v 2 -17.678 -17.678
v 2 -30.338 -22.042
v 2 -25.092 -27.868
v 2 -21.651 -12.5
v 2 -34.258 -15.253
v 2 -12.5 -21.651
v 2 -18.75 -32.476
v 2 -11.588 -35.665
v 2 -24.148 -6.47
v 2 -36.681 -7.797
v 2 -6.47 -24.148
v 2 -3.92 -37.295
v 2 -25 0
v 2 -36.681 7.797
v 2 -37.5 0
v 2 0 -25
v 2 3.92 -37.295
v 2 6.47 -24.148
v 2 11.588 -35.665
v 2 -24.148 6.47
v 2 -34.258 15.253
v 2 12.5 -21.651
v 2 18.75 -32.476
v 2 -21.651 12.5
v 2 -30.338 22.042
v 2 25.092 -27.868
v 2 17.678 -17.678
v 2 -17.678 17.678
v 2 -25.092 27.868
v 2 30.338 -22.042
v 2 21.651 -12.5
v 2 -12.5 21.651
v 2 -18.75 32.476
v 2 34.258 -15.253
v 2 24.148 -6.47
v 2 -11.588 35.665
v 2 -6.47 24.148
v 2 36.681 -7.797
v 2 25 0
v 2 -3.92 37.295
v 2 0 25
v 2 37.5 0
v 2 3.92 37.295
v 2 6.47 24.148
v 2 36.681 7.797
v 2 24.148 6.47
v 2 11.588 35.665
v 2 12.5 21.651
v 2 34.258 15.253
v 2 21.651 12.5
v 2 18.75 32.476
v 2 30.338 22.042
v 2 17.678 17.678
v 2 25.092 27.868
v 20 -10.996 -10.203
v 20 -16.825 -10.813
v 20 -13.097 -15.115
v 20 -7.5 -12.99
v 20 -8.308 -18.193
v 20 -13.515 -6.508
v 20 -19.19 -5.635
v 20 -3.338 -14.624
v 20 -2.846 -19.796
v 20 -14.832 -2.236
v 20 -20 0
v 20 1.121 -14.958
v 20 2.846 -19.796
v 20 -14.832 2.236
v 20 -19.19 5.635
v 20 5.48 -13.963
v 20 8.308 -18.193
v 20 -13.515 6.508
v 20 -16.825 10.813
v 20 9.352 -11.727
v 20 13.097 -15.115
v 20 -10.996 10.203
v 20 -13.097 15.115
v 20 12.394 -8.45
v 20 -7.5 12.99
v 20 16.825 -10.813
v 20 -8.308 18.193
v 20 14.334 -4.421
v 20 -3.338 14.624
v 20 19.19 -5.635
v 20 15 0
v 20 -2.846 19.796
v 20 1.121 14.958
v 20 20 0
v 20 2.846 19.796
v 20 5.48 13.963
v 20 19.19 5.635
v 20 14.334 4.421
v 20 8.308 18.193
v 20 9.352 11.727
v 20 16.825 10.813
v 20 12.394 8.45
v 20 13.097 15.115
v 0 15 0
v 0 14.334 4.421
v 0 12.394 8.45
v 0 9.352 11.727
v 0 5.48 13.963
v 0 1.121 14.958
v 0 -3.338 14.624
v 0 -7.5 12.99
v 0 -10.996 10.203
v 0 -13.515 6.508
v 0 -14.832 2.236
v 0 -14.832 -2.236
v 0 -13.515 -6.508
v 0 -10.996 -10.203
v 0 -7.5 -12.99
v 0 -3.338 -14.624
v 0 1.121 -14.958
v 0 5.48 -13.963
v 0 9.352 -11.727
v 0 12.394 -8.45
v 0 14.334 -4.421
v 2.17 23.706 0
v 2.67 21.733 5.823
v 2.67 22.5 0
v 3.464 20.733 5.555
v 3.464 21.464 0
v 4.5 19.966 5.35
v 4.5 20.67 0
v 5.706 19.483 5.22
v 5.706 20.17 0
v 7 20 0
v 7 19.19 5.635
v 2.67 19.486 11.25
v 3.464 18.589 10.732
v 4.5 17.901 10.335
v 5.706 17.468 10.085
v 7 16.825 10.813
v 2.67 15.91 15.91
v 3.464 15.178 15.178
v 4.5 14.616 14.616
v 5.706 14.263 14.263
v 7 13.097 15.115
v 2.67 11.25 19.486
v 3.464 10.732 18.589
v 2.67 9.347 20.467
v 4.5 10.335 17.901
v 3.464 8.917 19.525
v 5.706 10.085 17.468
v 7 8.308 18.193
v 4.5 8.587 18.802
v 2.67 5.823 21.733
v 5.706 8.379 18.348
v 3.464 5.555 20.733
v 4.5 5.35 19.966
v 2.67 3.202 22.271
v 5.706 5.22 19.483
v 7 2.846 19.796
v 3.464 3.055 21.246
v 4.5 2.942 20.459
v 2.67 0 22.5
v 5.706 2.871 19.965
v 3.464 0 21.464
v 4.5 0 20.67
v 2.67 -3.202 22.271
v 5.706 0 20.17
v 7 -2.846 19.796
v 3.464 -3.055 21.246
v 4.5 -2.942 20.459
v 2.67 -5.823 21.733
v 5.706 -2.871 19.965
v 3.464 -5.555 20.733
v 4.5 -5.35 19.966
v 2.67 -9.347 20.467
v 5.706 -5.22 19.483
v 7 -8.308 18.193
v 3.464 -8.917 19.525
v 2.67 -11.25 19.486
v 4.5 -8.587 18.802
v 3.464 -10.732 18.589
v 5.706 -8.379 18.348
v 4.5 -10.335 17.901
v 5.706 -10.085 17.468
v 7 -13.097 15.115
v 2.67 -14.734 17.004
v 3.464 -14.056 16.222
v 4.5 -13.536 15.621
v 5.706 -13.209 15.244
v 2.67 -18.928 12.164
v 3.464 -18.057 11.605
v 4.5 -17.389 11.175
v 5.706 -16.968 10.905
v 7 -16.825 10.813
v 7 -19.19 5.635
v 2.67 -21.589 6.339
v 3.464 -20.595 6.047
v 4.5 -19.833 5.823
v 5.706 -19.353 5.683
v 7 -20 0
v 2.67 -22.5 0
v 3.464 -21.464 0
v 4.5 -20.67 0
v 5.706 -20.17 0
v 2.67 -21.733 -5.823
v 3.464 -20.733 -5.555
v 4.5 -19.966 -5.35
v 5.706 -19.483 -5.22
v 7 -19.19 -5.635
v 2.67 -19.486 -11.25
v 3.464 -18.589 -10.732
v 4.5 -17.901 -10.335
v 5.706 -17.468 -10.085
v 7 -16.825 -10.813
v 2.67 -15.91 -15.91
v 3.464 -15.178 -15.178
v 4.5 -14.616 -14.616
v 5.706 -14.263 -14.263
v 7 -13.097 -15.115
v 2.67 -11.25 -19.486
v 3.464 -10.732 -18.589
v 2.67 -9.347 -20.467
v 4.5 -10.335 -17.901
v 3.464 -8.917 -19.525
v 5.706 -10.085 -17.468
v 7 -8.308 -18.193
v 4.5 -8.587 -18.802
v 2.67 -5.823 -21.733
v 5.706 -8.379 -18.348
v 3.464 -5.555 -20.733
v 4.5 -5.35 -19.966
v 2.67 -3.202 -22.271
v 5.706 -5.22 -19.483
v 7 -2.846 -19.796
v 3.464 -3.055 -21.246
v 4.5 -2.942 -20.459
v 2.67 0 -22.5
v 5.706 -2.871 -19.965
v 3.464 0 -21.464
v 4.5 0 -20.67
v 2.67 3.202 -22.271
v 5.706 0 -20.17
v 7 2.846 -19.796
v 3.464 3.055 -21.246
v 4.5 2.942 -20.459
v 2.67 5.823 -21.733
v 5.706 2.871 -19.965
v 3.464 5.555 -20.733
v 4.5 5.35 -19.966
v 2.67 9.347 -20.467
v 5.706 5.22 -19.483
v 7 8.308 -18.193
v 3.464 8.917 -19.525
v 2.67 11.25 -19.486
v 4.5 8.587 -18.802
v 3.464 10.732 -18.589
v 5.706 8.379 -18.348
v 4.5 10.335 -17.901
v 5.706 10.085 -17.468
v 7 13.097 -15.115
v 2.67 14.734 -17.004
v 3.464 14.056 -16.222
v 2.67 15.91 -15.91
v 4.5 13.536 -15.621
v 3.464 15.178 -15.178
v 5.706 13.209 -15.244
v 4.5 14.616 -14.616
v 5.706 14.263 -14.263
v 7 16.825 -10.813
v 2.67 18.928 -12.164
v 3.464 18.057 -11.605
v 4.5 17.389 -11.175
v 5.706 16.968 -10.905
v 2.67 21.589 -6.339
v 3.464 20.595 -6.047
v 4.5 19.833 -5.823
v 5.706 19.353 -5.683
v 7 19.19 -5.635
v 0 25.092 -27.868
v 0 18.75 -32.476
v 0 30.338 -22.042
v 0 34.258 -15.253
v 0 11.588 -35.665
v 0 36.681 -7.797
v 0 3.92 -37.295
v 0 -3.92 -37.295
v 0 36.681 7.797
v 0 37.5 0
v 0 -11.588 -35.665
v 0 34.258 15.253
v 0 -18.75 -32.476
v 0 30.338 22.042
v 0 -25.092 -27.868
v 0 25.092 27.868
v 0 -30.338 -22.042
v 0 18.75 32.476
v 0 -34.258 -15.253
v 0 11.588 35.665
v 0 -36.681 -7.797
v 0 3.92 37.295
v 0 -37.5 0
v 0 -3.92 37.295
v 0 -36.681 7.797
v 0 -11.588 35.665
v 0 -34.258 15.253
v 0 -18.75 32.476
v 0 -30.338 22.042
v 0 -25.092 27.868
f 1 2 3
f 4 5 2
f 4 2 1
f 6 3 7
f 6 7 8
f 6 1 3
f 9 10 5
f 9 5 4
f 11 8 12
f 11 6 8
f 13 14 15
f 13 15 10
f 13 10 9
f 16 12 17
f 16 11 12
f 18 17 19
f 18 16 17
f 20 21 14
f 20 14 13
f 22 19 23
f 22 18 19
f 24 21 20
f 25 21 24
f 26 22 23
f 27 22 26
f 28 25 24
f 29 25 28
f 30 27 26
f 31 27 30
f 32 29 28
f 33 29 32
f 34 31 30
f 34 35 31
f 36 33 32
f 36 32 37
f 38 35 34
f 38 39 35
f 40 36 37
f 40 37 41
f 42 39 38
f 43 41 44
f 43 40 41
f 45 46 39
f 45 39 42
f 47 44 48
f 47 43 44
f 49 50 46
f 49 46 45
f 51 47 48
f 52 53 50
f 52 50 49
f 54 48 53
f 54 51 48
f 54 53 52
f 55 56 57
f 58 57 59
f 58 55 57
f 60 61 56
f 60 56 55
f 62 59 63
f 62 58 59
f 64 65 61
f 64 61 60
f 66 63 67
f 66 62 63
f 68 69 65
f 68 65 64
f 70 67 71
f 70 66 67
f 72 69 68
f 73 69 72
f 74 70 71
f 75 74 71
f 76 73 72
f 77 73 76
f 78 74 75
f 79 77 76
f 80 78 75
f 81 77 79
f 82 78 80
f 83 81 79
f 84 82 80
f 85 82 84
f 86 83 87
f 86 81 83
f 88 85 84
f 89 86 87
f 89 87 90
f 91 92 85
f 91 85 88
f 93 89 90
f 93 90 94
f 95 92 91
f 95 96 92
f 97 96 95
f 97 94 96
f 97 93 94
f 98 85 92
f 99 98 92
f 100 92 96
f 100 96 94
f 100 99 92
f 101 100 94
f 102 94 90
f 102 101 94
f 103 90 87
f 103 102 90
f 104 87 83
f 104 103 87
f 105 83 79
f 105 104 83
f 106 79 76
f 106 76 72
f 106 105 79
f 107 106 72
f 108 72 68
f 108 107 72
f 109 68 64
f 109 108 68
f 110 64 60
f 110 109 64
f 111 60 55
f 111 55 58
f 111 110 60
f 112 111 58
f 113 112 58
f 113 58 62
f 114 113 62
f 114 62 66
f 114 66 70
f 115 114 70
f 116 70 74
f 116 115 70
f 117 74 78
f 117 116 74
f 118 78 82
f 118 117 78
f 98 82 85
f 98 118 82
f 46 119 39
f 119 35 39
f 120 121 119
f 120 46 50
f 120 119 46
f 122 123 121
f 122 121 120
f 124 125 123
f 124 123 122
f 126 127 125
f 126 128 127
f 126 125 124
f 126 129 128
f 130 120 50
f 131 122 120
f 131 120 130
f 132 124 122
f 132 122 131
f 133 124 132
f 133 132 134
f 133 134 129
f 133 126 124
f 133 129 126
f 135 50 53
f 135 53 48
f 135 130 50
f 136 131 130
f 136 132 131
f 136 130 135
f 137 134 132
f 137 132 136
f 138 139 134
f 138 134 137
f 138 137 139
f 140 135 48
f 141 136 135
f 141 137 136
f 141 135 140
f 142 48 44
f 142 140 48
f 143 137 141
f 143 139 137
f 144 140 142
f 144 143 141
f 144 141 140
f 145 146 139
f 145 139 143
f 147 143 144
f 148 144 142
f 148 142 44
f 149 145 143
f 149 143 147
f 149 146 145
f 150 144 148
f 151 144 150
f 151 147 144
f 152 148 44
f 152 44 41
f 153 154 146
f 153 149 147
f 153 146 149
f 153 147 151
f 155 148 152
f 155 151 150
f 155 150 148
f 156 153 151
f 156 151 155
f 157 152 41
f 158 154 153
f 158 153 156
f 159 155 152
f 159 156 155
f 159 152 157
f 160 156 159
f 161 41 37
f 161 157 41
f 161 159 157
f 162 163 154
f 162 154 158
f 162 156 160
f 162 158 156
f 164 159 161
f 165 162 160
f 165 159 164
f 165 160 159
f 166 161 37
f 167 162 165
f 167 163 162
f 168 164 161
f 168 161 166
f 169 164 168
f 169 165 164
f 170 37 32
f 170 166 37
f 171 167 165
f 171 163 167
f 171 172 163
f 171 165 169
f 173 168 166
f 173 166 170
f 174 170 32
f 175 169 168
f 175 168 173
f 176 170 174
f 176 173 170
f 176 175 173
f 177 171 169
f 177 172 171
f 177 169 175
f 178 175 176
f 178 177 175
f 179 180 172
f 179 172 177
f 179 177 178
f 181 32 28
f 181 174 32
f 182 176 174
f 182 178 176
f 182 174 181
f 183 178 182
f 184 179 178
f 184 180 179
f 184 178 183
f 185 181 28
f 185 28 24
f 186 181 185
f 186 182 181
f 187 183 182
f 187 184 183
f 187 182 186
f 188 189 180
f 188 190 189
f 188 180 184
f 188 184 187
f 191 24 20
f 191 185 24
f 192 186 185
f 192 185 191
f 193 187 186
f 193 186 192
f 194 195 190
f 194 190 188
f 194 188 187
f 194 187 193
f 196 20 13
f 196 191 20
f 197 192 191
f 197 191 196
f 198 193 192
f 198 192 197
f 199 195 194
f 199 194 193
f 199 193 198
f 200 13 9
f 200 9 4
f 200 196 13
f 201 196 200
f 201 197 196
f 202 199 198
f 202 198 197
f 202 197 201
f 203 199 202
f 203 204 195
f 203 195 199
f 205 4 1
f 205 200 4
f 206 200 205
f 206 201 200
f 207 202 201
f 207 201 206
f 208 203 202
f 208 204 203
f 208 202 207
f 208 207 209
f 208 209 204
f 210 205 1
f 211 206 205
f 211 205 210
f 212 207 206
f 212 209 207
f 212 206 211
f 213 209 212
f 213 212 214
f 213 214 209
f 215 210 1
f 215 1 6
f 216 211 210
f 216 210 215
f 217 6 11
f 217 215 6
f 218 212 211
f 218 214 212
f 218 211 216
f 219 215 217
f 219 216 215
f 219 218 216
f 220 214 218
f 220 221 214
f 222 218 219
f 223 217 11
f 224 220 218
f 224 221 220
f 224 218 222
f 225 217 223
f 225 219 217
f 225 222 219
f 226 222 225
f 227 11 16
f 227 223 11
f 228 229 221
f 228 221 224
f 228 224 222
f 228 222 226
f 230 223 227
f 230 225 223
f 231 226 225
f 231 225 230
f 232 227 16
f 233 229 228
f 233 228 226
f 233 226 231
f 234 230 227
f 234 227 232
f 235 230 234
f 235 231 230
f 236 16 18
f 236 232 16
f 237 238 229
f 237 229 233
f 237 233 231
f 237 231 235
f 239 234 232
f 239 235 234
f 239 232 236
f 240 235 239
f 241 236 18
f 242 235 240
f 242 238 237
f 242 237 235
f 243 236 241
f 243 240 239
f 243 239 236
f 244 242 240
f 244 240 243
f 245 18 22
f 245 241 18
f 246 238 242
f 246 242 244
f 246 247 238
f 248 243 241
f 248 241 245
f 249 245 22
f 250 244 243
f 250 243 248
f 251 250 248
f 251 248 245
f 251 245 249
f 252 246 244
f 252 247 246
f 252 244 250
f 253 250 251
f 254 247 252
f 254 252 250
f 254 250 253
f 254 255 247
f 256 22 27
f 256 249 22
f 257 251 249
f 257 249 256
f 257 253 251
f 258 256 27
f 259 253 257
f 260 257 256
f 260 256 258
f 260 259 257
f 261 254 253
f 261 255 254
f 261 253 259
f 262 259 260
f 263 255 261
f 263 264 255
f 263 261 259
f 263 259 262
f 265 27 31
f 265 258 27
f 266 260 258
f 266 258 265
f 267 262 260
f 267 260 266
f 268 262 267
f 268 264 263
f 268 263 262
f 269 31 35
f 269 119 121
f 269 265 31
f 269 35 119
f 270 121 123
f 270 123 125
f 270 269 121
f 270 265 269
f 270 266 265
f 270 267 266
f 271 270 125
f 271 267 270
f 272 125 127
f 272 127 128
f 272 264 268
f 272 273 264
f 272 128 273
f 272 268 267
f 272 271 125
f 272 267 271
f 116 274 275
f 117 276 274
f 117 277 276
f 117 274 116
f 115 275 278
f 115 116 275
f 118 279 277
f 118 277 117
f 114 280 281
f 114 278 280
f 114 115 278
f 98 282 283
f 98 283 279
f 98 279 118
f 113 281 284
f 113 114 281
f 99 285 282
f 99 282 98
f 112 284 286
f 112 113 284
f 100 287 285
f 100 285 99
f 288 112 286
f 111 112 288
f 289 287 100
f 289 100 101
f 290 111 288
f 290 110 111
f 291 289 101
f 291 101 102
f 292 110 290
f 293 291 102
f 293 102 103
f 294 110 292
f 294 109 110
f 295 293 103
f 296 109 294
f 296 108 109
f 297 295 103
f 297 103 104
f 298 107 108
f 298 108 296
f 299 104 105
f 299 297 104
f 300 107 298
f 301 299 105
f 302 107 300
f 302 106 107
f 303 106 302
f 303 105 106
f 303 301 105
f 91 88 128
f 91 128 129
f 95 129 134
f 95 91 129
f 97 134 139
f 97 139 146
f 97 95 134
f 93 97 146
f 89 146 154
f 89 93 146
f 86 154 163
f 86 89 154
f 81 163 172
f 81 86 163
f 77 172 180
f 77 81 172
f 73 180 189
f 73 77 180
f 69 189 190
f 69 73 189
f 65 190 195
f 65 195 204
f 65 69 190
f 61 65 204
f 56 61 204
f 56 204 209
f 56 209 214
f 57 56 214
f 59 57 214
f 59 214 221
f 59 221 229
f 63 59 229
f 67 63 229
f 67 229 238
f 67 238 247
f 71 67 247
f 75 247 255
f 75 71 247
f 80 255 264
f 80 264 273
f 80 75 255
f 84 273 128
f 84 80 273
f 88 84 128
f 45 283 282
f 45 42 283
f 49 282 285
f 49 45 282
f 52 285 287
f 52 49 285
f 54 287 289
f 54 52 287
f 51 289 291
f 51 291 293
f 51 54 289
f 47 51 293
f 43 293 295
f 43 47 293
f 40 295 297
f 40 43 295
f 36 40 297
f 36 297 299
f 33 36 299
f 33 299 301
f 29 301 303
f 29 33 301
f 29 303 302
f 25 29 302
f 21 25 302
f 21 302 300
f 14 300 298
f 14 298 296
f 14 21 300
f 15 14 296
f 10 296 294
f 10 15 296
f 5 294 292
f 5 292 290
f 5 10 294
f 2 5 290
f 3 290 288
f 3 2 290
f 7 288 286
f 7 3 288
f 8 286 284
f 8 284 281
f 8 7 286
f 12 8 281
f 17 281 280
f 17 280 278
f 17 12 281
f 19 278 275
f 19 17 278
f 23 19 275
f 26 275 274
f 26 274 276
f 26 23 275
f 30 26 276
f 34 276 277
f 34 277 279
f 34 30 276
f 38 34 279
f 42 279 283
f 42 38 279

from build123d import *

# Parameters (mm, degrees)
RADYUS1_R = 5


with BuildPart() as part:
    # Çizim1 → Döndür1 (revolve)
    with BuildSketch(Plane.XY):
        Polygon((0, 37.5), (2, 37.5), (2, 20), (20, 20), (20, 15), (0, 15), align=None)
    revolve(axis=Axis((0, 0, 0), (1, 0, 0)))

    # Radyus1
    radyus1_edges = [part.edges().sort_by_distance(p)[0] for p in [
        (2, -20, 0),
    ]]
    fillet(radyus1_edges, radius=RADYUS1_R)


solid = part.part
